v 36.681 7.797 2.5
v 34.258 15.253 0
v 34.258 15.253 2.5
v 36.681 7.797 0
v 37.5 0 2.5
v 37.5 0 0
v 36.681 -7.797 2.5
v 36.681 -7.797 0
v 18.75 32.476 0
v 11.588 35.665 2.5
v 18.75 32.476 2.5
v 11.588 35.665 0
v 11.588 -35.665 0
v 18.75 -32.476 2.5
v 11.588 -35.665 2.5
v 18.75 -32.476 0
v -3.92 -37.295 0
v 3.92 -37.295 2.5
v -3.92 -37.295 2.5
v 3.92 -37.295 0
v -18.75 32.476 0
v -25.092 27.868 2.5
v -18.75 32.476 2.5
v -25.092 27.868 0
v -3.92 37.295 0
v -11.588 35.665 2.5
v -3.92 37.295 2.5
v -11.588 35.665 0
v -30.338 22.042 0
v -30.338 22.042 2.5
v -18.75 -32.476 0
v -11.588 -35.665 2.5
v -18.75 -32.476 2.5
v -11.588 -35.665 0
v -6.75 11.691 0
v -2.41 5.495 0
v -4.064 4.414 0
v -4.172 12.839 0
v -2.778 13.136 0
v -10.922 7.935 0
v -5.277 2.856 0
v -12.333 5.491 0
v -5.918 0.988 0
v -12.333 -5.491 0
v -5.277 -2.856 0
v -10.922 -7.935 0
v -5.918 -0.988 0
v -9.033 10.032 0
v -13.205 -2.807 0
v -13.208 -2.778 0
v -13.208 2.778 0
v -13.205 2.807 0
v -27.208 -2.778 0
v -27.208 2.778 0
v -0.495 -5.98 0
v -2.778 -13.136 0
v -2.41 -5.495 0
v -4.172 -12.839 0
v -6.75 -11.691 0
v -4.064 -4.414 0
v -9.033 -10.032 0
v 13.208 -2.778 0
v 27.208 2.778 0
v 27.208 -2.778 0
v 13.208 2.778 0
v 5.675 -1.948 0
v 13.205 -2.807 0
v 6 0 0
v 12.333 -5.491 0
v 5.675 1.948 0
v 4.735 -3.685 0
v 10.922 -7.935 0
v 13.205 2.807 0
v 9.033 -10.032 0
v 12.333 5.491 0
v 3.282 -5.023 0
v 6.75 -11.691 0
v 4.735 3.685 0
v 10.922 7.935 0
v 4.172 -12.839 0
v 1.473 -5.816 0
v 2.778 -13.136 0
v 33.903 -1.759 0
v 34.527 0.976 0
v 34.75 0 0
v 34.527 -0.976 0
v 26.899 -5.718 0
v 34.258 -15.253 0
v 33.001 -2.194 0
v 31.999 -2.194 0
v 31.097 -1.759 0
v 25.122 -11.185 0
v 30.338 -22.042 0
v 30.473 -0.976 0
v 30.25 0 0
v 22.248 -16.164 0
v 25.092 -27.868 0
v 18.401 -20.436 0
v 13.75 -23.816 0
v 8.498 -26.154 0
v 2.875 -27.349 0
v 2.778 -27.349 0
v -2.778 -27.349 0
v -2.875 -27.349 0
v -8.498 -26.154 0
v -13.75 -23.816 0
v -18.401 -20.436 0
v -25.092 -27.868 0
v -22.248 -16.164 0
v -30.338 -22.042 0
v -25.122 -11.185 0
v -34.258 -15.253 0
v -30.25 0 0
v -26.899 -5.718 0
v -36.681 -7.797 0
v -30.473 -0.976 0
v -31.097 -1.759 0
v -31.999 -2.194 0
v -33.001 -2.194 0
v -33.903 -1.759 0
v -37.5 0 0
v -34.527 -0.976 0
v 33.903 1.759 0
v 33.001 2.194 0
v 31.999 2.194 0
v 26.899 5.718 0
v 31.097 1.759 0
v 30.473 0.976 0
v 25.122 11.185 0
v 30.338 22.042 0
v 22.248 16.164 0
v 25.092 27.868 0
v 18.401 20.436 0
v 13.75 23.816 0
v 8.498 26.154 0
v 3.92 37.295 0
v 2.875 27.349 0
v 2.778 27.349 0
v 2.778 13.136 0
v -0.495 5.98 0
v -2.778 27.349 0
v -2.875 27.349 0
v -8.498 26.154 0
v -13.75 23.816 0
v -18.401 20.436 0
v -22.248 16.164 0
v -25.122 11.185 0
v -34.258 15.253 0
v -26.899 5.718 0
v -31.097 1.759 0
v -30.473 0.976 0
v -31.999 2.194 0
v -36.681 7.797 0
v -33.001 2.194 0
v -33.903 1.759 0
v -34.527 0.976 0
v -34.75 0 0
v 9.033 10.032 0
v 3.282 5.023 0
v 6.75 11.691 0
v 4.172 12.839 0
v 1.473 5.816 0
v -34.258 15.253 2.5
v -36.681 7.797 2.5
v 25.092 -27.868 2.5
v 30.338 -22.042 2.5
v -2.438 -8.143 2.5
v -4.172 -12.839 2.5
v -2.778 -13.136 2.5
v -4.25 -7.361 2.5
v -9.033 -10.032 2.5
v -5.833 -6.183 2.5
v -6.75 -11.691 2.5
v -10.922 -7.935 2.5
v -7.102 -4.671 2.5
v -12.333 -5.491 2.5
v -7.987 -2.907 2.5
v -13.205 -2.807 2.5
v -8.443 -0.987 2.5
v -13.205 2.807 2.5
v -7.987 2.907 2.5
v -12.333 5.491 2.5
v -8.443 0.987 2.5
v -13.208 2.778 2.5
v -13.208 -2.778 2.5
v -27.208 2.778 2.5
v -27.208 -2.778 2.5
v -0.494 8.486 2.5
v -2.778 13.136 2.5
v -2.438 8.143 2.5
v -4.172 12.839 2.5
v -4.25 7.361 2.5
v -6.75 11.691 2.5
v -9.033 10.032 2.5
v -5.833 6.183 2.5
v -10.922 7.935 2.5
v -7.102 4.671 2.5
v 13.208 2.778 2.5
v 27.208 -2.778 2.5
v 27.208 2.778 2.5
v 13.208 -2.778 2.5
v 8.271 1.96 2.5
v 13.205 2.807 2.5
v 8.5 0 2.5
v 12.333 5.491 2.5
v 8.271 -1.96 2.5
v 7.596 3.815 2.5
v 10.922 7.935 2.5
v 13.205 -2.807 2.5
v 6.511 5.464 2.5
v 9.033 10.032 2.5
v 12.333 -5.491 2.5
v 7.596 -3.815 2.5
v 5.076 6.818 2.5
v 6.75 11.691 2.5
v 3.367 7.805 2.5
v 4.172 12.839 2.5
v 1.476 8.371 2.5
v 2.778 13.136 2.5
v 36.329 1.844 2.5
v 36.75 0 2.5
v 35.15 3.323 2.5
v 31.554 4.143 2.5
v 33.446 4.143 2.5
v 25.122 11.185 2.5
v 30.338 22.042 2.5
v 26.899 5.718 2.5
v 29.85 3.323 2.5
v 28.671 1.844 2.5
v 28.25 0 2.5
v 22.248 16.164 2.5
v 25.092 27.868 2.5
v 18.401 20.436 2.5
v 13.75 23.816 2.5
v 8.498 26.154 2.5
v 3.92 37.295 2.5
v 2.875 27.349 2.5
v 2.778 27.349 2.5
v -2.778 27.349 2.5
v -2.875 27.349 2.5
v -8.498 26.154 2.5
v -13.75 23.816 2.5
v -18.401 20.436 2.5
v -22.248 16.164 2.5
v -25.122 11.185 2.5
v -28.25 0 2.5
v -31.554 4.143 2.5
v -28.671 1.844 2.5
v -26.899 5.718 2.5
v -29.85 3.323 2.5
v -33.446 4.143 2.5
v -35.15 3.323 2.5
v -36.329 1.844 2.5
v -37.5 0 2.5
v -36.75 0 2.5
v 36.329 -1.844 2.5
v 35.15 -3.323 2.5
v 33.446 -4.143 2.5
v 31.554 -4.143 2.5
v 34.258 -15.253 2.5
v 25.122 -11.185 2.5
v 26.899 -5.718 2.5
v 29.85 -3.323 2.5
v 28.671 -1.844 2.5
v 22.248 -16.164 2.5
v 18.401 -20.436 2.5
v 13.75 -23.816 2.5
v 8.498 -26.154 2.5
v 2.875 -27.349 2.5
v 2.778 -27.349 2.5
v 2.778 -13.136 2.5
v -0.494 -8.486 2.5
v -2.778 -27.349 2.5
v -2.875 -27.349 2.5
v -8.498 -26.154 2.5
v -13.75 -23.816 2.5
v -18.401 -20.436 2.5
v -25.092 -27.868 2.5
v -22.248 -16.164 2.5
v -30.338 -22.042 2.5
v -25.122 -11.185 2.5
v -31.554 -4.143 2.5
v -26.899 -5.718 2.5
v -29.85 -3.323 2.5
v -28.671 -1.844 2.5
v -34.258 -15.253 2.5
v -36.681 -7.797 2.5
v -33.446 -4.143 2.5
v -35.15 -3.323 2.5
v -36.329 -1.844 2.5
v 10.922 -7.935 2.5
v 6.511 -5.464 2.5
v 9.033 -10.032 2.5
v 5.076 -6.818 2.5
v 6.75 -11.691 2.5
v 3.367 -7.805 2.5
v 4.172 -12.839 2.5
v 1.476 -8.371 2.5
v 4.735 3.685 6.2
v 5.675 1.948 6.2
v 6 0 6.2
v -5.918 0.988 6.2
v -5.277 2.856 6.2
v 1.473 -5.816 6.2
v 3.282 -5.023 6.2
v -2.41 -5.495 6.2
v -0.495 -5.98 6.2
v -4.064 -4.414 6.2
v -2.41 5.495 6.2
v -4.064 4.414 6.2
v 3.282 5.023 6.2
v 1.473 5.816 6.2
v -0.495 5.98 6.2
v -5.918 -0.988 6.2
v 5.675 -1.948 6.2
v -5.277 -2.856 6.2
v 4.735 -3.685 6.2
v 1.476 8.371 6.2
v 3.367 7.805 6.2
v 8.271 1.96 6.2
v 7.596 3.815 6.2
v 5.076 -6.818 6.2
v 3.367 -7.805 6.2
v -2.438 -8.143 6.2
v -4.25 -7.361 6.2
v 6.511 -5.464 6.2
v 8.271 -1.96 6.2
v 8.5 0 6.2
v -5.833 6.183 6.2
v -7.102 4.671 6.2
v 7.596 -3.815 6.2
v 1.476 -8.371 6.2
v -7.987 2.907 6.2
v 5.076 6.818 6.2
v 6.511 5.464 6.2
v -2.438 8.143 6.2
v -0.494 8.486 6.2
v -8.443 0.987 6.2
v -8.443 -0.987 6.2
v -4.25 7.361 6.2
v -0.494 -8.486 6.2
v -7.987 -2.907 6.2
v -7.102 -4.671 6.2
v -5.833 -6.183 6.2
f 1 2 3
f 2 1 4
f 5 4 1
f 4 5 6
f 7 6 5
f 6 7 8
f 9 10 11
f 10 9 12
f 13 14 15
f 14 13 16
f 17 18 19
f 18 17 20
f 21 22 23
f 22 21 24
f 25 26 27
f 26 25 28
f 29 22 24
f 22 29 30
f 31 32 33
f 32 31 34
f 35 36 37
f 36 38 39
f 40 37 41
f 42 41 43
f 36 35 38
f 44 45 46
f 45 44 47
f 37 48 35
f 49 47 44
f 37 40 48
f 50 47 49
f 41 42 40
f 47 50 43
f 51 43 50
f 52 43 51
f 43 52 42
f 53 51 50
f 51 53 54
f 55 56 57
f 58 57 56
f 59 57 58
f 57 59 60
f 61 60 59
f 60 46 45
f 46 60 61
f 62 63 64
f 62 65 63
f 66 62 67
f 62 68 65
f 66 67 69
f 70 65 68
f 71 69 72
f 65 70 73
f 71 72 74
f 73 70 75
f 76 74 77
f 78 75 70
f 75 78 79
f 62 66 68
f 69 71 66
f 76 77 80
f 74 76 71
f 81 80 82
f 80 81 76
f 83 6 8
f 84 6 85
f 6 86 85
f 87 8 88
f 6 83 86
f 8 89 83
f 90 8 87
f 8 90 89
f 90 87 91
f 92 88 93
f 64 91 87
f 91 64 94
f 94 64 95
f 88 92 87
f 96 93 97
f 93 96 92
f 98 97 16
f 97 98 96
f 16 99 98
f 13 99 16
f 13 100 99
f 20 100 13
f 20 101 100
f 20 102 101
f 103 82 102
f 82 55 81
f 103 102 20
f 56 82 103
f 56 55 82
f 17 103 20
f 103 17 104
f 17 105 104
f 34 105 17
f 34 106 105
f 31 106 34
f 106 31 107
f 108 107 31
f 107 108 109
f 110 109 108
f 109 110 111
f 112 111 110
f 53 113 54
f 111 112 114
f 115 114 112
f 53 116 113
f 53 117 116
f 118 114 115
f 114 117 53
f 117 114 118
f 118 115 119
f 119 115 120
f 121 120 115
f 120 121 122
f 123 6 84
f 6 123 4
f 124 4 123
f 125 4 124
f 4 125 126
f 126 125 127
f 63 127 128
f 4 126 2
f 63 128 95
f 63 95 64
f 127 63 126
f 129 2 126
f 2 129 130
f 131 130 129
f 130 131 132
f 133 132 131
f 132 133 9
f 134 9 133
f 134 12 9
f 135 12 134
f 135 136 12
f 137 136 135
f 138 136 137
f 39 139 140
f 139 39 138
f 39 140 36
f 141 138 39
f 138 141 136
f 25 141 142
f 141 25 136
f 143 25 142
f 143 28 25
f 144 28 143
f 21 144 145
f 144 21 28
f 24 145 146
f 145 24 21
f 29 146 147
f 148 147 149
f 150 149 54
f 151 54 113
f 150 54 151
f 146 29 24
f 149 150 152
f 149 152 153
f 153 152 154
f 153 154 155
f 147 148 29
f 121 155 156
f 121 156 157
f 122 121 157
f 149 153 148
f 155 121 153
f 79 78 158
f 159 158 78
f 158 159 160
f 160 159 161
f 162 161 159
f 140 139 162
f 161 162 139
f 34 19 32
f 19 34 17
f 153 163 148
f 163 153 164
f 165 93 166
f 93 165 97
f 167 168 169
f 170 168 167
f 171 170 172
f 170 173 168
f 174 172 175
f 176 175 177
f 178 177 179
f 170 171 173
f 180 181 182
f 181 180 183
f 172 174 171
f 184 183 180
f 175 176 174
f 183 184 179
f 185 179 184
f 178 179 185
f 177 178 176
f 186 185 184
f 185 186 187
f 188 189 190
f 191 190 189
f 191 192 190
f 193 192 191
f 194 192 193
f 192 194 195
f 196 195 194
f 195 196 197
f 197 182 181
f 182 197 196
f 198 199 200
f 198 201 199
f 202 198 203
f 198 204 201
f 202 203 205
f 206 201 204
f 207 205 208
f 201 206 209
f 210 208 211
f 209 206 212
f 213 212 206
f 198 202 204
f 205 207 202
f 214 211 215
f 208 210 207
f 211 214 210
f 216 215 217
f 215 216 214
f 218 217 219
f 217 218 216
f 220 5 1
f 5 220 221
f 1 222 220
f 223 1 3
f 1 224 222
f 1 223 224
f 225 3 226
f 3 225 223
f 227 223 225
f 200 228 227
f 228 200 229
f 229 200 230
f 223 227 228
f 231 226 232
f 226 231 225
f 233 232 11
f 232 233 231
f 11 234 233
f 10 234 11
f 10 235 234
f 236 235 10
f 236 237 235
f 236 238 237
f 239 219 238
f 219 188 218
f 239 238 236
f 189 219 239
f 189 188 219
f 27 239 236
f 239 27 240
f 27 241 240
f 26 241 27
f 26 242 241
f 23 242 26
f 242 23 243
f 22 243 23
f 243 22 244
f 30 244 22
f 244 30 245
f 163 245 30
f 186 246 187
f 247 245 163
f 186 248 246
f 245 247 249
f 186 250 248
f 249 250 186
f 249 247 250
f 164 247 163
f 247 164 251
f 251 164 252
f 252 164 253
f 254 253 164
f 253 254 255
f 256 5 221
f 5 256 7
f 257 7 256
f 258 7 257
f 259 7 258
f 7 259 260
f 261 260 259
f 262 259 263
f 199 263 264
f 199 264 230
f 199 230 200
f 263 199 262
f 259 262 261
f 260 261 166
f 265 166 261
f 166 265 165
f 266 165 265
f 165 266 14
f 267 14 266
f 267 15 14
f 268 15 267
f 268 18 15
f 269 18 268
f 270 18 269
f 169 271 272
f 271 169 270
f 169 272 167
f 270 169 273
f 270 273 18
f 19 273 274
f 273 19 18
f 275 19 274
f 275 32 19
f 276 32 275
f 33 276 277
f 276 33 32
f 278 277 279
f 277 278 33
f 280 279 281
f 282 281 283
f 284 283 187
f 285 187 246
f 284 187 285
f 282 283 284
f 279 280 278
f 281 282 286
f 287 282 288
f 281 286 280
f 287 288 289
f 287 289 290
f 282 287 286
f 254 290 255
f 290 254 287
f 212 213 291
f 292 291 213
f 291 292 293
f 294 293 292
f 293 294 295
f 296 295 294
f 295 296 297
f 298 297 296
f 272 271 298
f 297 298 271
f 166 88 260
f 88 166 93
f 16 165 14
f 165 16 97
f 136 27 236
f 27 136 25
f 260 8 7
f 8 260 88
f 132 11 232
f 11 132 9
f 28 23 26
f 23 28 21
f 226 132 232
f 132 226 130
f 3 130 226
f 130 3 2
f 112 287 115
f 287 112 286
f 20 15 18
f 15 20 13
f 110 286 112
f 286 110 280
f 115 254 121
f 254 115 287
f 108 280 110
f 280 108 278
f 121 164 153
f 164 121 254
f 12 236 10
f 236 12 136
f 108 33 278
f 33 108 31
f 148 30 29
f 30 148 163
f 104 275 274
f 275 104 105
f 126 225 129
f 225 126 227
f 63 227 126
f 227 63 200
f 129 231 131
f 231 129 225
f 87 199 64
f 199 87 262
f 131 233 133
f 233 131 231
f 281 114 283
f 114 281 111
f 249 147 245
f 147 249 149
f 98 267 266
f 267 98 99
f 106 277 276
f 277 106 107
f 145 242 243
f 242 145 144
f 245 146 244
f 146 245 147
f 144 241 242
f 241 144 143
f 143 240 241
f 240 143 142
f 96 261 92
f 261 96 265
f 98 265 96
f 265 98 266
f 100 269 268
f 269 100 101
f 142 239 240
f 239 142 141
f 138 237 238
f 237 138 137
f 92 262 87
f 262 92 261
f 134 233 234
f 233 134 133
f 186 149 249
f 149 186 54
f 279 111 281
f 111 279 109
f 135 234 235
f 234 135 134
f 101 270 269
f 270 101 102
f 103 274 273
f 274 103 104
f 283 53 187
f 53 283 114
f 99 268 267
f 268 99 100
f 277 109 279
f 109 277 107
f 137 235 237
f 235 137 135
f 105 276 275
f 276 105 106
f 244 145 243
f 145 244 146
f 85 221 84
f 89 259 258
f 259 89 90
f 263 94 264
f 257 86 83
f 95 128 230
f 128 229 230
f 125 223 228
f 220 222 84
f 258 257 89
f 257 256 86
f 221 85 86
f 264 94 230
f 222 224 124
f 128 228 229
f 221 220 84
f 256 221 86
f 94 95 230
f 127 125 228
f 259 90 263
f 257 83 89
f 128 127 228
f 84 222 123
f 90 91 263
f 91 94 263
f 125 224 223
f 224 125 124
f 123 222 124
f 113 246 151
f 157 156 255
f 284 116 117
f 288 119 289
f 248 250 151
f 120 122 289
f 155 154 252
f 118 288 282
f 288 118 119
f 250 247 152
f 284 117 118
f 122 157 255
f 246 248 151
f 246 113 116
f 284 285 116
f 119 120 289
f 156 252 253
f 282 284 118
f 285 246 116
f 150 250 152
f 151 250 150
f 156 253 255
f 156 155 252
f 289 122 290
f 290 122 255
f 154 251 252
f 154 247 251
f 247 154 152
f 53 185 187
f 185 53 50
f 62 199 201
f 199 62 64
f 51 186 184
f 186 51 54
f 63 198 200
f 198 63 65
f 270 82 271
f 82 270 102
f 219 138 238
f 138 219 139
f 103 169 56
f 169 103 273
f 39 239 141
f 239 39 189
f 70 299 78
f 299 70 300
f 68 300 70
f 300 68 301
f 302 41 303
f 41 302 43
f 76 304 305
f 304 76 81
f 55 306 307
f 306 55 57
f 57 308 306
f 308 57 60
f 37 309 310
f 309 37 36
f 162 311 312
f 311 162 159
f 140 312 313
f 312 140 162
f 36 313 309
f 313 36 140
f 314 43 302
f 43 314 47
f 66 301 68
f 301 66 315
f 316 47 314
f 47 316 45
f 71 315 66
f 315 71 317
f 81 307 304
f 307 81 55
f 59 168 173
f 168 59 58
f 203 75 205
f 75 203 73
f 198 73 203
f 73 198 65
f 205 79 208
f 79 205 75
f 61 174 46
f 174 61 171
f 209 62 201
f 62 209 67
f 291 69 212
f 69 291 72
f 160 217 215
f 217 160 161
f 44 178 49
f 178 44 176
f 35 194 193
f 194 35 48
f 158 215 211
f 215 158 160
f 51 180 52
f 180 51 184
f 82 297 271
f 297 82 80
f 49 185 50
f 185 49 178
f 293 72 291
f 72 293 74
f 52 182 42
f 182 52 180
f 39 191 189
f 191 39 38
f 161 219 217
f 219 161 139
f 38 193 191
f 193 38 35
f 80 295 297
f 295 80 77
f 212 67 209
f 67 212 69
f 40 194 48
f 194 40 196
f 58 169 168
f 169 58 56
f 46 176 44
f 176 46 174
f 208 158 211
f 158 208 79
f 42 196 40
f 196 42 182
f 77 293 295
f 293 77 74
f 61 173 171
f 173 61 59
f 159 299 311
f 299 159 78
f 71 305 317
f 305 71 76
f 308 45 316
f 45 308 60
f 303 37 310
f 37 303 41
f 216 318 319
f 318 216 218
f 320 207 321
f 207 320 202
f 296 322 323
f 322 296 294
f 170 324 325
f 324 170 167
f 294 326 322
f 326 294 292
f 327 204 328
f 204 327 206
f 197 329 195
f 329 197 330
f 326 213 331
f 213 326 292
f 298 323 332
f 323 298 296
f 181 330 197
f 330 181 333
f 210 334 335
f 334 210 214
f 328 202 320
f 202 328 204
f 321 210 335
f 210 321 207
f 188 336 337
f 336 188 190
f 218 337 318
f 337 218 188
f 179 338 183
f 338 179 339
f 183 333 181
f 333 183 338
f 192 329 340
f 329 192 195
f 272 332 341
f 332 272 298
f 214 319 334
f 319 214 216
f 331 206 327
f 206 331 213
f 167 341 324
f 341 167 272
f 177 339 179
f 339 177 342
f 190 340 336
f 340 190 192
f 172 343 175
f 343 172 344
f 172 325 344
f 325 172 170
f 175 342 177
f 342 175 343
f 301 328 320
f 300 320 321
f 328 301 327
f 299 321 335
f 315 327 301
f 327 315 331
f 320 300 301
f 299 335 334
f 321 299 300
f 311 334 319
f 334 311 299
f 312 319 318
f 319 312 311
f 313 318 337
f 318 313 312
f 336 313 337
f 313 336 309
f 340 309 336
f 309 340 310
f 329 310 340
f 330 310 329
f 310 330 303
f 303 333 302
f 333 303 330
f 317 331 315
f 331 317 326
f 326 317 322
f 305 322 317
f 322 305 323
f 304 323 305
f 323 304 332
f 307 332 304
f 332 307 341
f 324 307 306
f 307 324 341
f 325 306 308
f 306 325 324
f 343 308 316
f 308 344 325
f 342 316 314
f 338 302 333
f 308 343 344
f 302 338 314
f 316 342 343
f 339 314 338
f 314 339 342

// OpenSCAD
/*$fn=180;*/
height=2.5;
nozzle_height=3.7;
router_diam=75;
outer_diam=17;
inner_diam=12;
stegbreite=10;


difference(){
    cylinder(d=router_diam, h=height);
    cylinder(d=router_diam-stegbreite*2, h=height);
    // screw holes
    translate([1,0,0]*(router_diam/2-stegbreite/2)){
        cylinder(d1=4.5, d2=8.5, h=height);
    }
    translate([-1,0,0]*(router_diam/2-stegbreite/2)){
        cylinder(d1=4.5, d2=8.5, h=height);
    }
}

// stege
difference(){
    union(){
        hull(){
            translate([1,0,0]*(router_diam/2-stegbreite-4.5)){
                translate([0,0,height/2])
                    cube([stegbreite, stegbreite/1.8, height], true);
            }
            translate([-1,0,0]*(router_diam/2-stegbreite-4.5)){
                translate([0,0,height/2])
                    cube([stegbreite, stegbreite/1.8, height], true);
            }
        }
        hull(){
            translate([0,1,0]*(router_diam/2-stegbreite-4.5)){
                translate([0,0,height/2])
                    cube([stegbreite/1.8, stegbreite, height], true);
            }
            translate([0,-1,0]*(router_diam/2-stegbreite-4.5)){
                translate([0,0,height/2])
                    cube([stegbreite/1.8, stegbreite, height], true);
            }
        }
    }
    cylinder(d=inner_diam, h=height);
}
// innerer cirecles
difference(){
    cylinder(d=outer_diam+stegbreite*1, h=height);
    cylinder(d=inner_diam, h=height);
}
// nozzle
difference(){
    cylinder(d=outer_diam, h=height+nozzle_height);
    cylinder(d=inner_diam, h=height+nozzle_height);
}
